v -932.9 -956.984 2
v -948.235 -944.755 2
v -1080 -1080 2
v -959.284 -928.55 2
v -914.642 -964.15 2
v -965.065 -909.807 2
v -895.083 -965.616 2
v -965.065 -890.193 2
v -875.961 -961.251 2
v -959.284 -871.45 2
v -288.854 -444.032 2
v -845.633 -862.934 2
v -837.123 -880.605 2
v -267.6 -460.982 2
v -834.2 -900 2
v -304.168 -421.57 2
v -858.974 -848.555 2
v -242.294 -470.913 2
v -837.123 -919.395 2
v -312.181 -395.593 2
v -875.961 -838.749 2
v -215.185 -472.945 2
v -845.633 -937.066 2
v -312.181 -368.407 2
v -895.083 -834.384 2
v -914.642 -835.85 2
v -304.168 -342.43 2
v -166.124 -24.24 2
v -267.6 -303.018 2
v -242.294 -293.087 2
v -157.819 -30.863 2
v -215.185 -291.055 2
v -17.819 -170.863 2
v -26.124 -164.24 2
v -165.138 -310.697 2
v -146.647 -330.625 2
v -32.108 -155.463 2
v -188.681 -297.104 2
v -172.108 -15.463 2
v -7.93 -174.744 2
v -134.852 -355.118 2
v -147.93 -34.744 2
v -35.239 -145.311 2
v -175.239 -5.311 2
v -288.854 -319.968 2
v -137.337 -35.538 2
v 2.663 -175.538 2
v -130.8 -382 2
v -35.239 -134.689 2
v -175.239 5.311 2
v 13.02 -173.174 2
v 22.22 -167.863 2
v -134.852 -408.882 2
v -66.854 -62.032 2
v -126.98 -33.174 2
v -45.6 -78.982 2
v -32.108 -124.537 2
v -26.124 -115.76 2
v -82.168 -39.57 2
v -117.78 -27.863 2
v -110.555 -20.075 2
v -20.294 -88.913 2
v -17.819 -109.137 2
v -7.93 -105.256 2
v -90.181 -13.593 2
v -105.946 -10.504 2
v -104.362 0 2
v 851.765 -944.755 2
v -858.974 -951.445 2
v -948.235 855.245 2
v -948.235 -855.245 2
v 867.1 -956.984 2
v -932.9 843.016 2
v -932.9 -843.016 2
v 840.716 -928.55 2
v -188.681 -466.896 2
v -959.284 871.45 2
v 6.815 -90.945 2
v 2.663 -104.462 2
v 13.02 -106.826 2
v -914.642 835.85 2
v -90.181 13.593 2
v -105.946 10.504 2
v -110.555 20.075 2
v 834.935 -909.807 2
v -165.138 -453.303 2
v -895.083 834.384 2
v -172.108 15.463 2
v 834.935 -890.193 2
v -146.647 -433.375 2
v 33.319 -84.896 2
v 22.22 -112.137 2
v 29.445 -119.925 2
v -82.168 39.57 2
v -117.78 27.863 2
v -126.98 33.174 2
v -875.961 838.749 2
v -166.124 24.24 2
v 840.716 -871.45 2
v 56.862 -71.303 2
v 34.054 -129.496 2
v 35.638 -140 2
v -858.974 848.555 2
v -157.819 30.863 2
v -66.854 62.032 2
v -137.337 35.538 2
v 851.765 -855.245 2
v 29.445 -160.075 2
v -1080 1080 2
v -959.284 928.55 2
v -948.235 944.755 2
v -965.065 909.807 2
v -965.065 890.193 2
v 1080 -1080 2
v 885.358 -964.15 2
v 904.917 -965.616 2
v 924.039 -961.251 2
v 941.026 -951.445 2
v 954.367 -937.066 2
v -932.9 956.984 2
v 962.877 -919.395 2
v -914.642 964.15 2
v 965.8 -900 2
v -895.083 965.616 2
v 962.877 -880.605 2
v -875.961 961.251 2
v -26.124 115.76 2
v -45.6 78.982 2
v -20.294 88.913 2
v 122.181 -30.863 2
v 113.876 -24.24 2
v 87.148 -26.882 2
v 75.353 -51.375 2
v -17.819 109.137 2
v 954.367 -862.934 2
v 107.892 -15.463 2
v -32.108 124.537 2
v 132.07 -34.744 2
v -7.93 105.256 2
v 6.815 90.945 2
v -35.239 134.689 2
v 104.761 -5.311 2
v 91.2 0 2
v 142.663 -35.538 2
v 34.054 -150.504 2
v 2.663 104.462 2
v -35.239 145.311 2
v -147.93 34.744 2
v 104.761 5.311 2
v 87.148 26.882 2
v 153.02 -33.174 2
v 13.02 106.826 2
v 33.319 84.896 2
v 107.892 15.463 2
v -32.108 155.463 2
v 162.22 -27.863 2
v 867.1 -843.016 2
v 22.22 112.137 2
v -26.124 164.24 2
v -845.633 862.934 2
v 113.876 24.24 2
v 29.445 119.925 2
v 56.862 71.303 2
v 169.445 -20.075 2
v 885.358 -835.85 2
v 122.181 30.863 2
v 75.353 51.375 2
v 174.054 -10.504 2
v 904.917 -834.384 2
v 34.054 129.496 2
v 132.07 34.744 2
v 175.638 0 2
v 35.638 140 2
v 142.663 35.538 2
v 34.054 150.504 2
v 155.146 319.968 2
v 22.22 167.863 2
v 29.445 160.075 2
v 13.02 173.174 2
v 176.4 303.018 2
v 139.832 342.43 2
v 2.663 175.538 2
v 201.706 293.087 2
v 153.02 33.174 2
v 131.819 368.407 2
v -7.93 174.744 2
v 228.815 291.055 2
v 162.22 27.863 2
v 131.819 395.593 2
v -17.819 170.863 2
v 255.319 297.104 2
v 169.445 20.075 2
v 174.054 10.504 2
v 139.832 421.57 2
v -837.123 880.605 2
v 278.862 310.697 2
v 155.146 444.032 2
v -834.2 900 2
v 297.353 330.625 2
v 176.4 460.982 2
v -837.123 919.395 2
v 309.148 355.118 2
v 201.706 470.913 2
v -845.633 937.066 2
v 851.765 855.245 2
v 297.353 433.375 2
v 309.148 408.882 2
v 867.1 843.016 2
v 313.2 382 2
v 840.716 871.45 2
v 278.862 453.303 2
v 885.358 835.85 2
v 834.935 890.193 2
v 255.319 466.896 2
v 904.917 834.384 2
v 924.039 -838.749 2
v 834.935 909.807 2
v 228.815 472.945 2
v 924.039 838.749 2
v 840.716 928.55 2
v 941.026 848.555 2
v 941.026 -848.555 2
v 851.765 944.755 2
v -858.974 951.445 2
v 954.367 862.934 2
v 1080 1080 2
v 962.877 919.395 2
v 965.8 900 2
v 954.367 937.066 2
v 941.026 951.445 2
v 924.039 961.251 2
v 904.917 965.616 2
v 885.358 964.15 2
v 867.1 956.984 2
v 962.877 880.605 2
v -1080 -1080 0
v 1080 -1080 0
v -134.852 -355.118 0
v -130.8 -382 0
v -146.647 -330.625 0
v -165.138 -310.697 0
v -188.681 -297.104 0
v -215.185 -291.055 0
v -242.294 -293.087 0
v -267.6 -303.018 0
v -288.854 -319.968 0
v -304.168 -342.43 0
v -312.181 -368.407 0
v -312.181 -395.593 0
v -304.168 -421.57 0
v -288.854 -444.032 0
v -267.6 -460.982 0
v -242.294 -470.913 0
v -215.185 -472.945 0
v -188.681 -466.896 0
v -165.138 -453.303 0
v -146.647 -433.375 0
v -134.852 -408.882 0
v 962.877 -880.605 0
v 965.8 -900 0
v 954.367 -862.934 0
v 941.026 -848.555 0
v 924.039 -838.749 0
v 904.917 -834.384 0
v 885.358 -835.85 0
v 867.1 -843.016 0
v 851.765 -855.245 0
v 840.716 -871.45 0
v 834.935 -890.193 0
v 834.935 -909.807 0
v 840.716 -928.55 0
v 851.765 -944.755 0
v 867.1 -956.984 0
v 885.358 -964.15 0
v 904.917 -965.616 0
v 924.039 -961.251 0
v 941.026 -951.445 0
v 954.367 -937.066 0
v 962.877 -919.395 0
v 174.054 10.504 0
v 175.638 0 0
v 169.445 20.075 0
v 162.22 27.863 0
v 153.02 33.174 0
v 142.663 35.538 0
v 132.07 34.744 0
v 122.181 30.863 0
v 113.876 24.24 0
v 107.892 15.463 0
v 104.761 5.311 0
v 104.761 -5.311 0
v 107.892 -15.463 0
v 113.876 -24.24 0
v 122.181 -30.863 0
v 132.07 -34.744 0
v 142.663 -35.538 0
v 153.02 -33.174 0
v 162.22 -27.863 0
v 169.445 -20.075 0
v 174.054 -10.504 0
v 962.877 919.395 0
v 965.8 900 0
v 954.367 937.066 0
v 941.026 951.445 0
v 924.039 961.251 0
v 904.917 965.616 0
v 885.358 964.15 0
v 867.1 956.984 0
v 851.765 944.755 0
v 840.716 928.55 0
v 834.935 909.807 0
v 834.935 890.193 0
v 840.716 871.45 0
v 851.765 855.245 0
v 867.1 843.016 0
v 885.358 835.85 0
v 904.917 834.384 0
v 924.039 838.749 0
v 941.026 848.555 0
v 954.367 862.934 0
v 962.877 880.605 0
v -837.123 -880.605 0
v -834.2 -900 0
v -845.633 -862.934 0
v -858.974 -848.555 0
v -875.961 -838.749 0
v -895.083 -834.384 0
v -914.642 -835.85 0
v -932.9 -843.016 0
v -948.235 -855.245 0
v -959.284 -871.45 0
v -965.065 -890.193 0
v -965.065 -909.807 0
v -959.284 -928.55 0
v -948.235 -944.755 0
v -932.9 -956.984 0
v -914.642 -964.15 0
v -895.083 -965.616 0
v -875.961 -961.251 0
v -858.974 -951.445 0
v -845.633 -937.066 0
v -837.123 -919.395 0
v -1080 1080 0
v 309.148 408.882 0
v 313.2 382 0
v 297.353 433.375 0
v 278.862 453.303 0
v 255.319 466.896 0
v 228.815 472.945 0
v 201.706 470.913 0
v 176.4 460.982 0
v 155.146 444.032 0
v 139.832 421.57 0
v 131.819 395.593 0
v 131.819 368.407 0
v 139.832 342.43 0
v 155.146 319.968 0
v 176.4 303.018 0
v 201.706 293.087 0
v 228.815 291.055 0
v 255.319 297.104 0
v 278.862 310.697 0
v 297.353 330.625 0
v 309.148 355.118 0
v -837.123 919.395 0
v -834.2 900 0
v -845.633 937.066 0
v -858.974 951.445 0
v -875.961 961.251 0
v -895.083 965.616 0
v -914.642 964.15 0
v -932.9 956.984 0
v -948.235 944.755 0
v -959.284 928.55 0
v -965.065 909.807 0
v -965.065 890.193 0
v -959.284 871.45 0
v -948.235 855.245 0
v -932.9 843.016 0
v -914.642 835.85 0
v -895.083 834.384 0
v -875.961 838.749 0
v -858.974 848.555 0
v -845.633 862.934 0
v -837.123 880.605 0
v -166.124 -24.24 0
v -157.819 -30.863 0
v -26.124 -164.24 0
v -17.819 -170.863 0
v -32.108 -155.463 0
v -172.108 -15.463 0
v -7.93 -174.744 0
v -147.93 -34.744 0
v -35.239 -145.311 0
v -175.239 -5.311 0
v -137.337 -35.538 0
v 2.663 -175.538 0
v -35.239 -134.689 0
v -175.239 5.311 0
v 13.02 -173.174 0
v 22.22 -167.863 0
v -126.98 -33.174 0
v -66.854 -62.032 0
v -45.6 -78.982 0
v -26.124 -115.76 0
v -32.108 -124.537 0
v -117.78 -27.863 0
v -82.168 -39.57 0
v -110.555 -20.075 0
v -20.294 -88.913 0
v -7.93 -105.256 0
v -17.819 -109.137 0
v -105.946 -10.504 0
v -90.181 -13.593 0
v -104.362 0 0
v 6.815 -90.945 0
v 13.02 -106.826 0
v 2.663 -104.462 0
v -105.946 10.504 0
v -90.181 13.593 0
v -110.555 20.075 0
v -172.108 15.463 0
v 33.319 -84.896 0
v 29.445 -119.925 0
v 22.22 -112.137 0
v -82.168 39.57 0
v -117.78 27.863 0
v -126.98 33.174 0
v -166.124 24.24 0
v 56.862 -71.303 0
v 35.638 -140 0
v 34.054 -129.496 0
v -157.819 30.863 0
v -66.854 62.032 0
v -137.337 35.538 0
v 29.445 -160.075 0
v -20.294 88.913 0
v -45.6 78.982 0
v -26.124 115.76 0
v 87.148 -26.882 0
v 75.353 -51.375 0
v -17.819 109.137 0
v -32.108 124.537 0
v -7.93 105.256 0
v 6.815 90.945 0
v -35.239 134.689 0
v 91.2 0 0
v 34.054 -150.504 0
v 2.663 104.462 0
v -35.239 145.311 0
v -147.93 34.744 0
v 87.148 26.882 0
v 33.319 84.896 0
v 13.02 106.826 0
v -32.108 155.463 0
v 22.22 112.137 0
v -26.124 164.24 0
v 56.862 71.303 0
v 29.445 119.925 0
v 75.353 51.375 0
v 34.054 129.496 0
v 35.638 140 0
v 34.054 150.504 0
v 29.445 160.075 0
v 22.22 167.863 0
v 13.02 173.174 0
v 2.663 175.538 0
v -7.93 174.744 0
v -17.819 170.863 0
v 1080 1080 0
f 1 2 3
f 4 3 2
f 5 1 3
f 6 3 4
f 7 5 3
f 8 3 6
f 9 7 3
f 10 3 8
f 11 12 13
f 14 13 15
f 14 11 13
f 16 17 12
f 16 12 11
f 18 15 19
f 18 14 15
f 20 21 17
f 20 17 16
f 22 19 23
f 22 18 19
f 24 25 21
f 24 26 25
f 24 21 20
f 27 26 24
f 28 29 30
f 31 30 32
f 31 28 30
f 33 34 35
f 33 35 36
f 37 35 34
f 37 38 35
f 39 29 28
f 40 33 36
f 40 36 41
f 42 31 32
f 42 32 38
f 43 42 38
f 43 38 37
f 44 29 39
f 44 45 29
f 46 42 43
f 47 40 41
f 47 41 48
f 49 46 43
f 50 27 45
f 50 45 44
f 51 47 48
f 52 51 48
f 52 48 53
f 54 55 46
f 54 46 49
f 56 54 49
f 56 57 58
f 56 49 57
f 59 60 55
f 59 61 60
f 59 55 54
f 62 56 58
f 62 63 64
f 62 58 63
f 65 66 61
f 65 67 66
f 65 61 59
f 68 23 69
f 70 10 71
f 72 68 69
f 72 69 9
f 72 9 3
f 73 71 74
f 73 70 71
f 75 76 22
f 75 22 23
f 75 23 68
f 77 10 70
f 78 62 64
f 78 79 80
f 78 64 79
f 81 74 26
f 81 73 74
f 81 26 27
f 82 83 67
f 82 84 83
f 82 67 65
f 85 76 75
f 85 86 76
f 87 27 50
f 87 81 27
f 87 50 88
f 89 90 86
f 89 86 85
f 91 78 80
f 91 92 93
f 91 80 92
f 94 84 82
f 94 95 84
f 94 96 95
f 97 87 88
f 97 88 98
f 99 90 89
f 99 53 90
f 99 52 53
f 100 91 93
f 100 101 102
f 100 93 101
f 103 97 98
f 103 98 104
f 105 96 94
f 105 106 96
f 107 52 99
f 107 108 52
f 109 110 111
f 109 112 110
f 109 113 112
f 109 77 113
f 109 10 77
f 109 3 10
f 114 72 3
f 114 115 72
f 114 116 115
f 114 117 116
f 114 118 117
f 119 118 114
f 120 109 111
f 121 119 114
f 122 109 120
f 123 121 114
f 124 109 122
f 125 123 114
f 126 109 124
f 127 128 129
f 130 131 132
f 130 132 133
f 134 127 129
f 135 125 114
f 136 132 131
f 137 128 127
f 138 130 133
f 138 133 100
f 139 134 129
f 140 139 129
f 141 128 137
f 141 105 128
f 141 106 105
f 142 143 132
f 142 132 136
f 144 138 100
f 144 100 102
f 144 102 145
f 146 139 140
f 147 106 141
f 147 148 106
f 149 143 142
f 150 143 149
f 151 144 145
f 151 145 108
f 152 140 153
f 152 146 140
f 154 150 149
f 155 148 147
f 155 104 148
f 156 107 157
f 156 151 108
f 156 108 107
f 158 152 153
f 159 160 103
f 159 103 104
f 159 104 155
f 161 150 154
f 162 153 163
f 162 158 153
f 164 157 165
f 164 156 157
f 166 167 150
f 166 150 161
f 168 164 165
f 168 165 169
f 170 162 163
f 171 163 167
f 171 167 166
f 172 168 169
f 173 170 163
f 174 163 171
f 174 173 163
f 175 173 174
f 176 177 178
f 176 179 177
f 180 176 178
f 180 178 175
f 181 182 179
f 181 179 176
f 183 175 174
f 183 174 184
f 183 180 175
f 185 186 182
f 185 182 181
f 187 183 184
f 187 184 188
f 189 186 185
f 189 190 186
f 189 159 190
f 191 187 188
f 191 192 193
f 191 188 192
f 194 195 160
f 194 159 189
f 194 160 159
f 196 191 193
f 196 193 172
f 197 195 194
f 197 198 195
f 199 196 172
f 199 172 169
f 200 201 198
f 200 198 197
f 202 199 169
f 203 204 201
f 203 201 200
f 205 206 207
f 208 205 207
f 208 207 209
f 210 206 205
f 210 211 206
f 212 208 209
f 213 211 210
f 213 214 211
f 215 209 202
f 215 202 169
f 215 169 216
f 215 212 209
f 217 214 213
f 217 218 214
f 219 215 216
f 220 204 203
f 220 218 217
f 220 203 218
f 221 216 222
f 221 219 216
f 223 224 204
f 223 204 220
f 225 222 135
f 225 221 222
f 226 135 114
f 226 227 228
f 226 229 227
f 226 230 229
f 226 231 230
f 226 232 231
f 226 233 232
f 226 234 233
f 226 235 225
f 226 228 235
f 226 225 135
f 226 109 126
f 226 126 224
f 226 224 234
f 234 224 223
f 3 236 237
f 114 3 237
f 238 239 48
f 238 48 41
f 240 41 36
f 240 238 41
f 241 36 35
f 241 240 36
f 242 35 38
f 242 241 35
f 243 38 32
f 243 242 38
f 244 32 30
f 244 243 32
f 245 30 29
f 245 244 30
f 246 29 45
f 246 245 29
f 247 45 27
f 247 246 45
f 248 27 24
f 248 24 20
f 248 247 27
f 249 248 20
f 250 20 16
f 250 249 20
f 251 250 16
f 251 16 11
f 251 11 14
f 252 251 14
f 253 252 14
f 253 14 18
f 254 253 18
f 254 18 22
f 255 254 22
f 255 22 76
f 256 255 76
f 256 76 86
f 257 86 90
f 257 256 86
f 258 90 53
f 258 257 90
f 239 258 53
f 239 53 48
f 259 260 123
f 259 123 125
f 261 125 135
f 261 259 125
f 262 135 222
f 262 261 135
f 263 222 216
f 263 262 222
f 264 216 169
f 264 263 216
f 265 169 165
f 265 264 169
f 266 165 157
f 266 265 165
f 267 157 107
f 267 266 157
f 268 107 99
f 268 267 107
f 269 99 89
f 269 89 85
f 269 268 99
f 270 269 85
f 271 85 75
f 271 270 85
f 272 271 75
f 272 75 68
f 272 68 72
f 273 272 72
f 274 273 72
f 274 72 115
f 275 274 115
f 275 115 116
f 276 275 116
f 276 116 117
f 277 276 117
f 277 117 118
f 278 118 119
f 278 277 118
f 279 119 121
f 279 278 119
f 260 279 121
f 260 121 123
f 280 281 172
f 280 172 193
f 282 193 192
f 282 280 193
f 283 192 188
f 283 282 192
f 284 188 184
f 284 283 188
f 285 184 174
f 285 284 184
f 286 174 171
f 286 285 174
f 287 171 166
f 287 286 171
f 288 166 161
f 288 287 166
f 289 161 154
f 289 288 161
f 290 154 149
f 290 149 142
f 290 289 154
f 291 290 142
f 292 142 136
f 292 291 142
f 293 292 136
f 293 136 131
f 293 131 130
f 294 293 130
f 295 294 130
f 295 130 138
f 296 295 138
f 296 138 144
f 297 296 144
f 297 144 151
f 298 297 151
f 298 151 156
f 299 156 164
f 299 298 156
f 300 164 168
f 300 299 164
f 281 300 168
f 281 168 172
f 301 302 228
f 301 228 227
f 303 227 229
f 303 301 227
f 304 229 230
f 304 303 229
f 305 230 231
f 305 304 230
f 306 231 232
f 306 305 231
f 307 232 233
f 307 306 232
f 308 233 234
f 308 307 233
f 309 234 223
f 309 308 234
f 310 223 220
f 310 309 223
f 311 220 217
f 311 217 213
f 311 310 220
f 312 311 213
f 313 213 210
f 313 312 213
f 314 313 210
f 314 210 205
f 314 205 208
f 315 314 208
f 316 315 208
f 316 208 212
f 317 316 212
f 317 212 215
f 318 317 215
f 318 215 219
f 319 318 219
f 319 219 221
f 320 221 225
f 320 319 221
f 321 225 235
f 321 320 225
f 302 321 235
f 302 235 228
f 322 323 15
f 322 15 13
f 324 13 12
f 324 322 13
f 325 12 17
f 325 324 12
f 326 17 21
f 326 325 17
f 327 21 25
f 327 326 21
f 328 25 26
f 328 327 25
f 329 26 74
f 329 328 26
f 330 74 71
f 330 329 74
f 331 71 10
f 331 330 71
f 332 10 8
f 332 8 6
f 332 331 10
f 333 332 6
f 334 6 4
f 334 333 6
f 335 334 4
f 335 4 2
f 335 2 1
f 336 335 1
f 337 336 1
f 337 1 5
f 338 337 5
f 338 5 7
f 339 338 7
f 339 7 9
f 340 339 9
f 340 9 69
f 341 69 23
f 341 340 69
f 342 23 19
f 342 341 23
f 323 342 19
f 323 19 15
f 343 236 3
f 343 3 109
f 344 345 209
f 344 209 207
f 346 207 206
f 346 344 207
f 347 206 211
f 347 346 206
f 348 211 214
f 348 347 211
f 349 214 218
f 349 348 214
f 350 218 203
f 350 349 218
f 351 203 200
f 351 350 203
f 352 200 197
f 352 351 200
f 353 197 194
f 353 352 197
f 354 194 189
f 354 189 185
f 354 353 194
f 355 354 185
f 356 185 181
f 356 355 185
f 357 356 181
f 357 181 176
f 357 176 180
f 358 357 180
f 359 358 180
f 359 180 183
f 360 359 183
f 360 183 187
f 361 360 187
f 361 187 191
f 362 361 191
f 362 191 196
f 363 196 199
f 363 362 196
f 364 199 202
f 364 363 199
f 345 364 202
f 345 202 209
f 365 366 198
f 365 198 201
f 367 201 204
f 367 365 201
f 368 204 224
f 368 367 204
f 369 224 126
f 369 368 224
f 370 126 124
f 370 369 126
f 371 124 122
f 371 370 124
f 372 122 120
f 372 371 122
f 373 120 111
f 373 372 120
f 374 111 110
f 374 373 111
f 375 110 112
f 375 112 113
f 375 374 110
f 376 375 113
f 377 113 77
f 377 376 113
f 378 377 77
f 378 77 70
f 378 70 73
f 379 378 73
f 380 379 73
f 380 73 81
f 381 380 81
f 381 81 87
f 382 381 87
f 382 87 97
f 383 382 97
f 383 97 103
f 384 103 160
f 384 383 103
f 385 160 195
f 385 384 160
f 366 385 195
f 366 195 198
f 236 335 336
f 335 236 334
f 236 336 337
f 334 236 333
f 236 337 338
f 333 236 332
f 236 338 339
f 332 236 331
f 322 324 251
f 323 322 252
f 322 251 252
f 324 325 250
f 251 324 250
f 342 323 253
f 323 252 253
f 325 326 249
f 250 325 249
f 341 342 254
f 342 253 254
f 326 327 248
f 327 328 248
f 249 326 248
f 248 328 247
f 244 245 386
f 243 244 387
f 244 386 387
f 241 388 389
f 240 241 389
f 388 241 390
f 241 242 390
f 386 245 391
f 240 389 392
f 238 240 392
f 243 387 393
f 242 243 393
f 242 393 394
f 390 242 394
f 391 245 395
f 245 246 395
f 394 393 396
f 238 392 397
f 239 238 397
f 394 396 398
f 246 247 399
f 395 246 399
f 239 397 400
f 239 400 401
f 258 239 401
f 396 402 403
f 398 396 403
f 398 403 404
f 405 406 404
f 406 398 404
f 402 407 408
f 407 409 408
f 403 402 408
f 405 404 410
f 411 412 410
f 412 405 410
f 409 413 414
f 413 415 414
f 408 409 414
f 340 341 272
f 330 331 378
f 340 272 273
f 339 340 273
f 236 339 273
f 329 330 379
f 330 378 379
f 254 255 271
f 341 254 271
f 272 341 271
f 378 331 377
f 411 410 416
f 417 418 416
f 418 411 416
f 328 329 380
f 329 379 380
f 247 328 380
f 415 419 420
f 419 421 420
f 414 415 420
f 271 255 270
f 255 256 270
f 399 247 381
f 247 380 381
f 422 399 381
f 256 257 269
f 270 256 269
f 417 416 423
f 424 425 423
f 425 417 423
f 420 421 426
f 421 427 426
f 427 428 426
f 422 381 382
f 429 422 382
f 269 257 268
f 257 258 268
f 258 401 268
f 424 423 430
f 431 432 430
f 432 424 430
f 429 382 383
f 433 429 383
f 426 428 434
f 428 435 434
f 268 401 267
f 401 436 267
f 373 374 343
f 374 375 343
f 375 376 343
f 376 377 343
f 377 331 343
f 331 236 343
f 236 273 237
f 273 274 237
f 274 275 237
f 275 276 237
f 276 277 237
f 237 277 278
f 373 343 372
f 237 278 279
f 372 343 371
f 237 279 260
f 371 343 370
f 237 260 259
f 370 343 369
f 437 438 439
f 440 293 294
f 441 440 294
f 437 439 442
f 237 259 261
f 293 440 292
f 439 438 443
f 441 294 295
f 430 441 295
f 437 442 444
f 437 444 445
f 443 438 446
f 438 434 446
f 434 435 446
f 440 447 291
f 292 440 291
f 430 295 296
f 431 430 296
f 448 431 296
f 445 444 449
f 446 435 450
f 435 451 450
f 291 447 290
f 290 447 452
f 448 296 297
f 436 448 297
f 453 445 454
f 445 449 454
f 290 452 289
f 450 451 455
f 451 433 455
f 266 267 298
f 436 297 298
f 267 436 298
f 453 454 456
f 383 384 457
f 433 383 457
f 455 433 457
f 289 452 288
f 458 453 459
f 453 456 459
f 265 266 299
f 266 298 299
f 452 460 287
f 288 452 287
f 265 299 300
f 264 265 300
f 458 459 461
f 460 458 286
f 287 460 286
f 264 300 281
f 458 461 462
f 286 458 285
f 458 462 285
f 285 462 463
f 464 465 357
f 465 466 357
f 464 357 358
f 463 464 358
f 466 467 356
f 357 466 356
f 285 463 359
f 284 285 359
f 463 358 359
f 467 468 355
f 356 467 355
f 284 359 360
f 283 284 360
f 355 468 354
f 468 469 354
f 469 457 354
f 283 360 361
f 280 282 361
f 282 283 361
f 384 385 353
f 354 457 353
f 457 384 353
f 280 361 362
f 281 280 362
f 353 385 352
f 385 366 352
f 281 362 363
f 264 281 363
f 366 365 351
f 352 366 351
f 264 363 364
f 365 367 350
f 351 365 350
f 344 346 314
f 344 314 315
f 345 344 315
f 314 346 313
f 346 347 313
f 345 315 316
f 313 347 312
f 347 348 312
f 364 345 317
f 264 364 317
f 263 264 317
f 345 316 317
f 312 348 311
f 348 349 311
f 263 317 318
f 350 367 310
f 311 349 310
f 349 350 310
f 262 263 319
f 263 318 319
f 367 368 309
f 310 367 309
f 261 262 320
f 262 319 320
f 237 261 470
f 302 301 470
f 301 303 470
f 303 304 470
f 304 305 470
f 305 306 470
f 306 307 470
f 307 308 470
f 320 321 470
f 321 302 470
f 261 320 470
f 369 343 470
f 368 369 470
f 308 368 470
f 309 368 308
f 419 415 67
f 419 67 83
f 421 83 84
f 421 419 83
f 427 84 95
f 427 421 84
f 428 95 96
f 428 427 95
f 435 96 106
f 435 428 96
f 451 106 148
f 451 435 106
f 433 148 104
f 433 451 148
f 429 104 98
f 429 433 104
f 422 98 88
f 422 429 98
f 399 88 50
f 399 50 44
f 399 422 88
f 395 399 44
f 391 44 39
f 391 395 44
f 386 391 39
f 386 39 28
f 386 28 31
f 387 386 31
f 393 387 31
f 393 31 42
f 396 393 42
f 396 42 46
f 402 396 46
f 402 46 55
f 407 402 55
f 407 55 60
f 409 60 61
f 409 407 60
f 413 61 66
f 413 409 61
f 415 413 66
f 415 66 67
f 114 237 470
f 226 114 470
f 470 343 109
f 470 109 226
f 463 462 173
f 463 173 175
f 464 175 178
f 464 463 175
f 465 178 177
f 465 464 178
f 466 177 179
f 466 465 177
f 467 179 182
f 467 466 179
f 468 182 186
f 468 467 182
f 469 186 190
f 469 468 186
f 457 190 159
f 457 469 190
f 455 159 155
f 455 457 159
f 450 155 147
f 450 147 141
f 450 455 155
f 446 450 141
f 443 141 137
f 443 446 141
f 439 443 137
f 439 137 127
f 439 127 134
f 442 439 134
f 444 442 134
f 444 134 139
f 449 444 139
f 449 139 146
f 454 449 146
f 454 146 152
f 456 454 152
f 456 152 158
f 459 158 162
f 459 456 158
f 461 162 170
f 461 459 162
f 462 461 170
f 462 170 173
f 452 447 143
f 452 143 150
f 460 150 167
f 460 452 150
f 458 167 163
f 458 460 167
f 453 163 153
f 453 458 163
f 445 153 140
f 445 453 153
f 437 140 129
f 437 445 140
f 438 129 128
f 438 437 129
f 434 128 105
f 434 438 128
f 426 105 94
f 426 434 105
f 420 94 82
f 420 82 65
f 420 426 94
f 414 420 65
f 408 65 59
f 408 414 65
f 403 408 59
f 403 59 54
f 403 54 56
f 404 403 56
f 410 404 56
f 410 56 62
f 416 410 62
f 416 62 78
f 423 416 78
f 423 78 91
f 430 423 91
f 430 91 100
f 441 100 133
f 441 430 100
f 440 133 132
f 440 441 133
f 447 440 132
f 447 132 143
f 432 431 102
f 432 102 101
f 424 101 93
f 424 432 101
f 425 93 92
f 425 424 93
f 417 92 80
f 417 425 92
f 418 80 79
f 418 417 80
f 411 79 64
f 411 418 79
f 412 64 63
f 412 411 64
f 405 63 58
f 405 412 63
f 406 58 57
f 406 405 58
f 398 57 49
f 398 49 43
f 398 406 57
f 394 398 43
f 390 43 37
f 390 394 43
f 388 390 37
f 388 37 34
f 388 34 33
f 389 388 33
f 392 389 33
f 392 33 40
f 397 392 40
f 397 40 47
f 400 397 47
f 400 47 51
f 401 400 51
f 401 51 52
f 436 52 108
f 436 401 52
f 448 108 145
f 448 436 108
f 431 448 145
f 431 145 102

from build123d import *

# Parameters (mm, degrees)
SKETCH1_W           = 2160
SKETCH1_H           = 2160
SKETCH1_R           = 91.2
SKETCH1_R_2         = 35.6375
SKETCH1_R_3         = 65.8
BOSS_EXTRUDE1_DEPTH = 2


with BuildPart() as part:
    # Sketch1 → Boss-Extrude1 (new body)
    with BuildSketch(Plane.XY):
        Rectangle(SKETCH1_W, SKETCH1_H)
        Circle(SKETCH1_R, mode=Mode.SUBTRACT)
        with Locations((0, 140)):
            Circle(SKETCH1_R_2, mode=Mode.SUBTRACT)
        with Locations((222, 382)):
            Circle(SKETCH1_R, mode=Mode.SUBTRACT)
        with Locations((-222, -382)):
            Circle(SKETCH1_R, mode=Mode.SUBTRACT)
        with Locations((-900, 900)):
            Circle(SKETCH1_R_3, mode=Mode.SUBTRACT)
        with Locations((900, -900)):
            Circle(SKETCH1_R_3, mode=Mode.SUBTRACT)
        with Locations((900, 900)):
            Circle(SKETCH1_R_3, mode=Mode.SUBTRACT)
        with Locations((-900, -900)):
            Circle(SKETCH1_R_3, mode=Mode.SUBTRACT)
        with Locations((0, -140)):
            Circle(SKETCH1_R_2, mode=Mode.SUBTRACT)
        with Locations((140, 0)):
            Circle(SKETCH1_R_2, mode=Mode.SUBTRACT)
        with Locations((-140, 0)):
            Circle(SKETCH1_R_2, mode=Mode.SUBTRACT)
    extrude(amount=BOSS_EXTRUDE1_DEPTH)


solid = part.part
